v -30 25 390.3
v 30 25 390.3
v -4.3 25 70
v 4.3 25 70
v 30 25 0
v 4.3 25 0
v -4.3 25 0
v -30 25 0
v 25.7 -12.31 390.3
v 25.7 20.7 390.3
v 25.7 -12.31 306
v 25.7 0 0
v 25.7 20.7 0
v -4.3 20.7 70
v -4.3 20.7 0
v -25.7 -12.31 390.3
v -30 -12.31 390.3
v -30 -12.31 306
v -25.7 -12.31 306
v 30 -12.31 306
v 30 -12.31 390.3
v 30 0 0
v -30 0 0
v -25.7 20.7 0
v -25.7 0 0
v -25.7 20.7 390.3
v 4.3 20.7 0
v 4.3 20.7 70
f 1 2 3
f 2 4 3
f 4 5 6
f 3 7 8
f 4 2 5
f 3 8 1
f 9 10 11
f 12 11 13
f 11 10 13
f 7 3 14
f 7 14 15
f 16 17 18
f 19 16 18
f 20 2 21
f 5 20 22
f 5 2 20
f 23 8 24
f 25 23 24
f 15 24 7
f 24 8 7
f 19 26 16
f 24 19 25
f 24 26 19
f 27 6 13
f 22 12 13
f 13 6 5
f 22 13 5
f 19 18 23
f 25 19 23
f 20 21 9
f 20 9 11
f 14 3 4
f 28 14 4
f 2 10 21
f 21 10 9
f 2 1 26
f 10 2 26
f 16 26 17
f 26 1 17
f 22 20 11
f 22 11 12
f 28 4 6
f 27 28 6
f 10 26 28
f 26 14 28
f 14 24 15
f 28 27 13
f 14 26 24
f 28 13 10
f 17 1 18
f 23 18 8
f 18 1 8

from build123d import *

# Parameters (mm, degrees)
BOSS_EXTRUDE1_DEPTH = 390.3
BOSS_EXTRUDE2_DEPTH = 4.3
SKETCH3_W           = 8.6
SKETCH3_H           = 70
CUT_EXTRUDE1_DEPTH  = 10


with BuildPart() as part:
    # Sketch1 → Boss-Extrude1 (new body)
    with BuildSketch(Plane.XY):
        Polygon((-30, 0), (-25.7, 0), (-25.7, 20.7), (25.7, 20.7), (25.7, 0), (30, 0), (30, 25), (-30, 25), align=None)
    extrude(amount=BOSS_EXTRUDE1_DEPTH)

    # Sketch2 → Boss-Extrude2 (add)
    with BuildSketch(Plane(origin=(30, 0, 0), x_dir=(0, 0, -1), z_dir=(1, 0, 0))):
        Polygon((-306, -12.31), (0, 0), (-390.3, 0), (-390.3, -12.31), align=None)
    boss_extrude2 = extrude(amount=-BOSS_EXTRUDE2_DEPTH)

    # Mirror1: Boss-Extrude2 across plane
    add(boss_extrude2.mirror(Plane(origin=(0, 0, 0), x_dir=(0, 0, 1), z_dir=(1, 0, 0))))

    # Sketch3 → Cut-Extrude1 (cut)
    with BuildSketch(Plane(origin=(0, 25, 0), x_dir=(1, 0, 0), z_dir=(0, 1, 0))):
        with Locations((0, -35)):
            Rectangle(SKETCH3_W, SKETCH3_H)
    extrude(amount=-CUT_EXTRUDE1_DEPTH, mode=Mode.SUBTRACT)


solid = part.part
